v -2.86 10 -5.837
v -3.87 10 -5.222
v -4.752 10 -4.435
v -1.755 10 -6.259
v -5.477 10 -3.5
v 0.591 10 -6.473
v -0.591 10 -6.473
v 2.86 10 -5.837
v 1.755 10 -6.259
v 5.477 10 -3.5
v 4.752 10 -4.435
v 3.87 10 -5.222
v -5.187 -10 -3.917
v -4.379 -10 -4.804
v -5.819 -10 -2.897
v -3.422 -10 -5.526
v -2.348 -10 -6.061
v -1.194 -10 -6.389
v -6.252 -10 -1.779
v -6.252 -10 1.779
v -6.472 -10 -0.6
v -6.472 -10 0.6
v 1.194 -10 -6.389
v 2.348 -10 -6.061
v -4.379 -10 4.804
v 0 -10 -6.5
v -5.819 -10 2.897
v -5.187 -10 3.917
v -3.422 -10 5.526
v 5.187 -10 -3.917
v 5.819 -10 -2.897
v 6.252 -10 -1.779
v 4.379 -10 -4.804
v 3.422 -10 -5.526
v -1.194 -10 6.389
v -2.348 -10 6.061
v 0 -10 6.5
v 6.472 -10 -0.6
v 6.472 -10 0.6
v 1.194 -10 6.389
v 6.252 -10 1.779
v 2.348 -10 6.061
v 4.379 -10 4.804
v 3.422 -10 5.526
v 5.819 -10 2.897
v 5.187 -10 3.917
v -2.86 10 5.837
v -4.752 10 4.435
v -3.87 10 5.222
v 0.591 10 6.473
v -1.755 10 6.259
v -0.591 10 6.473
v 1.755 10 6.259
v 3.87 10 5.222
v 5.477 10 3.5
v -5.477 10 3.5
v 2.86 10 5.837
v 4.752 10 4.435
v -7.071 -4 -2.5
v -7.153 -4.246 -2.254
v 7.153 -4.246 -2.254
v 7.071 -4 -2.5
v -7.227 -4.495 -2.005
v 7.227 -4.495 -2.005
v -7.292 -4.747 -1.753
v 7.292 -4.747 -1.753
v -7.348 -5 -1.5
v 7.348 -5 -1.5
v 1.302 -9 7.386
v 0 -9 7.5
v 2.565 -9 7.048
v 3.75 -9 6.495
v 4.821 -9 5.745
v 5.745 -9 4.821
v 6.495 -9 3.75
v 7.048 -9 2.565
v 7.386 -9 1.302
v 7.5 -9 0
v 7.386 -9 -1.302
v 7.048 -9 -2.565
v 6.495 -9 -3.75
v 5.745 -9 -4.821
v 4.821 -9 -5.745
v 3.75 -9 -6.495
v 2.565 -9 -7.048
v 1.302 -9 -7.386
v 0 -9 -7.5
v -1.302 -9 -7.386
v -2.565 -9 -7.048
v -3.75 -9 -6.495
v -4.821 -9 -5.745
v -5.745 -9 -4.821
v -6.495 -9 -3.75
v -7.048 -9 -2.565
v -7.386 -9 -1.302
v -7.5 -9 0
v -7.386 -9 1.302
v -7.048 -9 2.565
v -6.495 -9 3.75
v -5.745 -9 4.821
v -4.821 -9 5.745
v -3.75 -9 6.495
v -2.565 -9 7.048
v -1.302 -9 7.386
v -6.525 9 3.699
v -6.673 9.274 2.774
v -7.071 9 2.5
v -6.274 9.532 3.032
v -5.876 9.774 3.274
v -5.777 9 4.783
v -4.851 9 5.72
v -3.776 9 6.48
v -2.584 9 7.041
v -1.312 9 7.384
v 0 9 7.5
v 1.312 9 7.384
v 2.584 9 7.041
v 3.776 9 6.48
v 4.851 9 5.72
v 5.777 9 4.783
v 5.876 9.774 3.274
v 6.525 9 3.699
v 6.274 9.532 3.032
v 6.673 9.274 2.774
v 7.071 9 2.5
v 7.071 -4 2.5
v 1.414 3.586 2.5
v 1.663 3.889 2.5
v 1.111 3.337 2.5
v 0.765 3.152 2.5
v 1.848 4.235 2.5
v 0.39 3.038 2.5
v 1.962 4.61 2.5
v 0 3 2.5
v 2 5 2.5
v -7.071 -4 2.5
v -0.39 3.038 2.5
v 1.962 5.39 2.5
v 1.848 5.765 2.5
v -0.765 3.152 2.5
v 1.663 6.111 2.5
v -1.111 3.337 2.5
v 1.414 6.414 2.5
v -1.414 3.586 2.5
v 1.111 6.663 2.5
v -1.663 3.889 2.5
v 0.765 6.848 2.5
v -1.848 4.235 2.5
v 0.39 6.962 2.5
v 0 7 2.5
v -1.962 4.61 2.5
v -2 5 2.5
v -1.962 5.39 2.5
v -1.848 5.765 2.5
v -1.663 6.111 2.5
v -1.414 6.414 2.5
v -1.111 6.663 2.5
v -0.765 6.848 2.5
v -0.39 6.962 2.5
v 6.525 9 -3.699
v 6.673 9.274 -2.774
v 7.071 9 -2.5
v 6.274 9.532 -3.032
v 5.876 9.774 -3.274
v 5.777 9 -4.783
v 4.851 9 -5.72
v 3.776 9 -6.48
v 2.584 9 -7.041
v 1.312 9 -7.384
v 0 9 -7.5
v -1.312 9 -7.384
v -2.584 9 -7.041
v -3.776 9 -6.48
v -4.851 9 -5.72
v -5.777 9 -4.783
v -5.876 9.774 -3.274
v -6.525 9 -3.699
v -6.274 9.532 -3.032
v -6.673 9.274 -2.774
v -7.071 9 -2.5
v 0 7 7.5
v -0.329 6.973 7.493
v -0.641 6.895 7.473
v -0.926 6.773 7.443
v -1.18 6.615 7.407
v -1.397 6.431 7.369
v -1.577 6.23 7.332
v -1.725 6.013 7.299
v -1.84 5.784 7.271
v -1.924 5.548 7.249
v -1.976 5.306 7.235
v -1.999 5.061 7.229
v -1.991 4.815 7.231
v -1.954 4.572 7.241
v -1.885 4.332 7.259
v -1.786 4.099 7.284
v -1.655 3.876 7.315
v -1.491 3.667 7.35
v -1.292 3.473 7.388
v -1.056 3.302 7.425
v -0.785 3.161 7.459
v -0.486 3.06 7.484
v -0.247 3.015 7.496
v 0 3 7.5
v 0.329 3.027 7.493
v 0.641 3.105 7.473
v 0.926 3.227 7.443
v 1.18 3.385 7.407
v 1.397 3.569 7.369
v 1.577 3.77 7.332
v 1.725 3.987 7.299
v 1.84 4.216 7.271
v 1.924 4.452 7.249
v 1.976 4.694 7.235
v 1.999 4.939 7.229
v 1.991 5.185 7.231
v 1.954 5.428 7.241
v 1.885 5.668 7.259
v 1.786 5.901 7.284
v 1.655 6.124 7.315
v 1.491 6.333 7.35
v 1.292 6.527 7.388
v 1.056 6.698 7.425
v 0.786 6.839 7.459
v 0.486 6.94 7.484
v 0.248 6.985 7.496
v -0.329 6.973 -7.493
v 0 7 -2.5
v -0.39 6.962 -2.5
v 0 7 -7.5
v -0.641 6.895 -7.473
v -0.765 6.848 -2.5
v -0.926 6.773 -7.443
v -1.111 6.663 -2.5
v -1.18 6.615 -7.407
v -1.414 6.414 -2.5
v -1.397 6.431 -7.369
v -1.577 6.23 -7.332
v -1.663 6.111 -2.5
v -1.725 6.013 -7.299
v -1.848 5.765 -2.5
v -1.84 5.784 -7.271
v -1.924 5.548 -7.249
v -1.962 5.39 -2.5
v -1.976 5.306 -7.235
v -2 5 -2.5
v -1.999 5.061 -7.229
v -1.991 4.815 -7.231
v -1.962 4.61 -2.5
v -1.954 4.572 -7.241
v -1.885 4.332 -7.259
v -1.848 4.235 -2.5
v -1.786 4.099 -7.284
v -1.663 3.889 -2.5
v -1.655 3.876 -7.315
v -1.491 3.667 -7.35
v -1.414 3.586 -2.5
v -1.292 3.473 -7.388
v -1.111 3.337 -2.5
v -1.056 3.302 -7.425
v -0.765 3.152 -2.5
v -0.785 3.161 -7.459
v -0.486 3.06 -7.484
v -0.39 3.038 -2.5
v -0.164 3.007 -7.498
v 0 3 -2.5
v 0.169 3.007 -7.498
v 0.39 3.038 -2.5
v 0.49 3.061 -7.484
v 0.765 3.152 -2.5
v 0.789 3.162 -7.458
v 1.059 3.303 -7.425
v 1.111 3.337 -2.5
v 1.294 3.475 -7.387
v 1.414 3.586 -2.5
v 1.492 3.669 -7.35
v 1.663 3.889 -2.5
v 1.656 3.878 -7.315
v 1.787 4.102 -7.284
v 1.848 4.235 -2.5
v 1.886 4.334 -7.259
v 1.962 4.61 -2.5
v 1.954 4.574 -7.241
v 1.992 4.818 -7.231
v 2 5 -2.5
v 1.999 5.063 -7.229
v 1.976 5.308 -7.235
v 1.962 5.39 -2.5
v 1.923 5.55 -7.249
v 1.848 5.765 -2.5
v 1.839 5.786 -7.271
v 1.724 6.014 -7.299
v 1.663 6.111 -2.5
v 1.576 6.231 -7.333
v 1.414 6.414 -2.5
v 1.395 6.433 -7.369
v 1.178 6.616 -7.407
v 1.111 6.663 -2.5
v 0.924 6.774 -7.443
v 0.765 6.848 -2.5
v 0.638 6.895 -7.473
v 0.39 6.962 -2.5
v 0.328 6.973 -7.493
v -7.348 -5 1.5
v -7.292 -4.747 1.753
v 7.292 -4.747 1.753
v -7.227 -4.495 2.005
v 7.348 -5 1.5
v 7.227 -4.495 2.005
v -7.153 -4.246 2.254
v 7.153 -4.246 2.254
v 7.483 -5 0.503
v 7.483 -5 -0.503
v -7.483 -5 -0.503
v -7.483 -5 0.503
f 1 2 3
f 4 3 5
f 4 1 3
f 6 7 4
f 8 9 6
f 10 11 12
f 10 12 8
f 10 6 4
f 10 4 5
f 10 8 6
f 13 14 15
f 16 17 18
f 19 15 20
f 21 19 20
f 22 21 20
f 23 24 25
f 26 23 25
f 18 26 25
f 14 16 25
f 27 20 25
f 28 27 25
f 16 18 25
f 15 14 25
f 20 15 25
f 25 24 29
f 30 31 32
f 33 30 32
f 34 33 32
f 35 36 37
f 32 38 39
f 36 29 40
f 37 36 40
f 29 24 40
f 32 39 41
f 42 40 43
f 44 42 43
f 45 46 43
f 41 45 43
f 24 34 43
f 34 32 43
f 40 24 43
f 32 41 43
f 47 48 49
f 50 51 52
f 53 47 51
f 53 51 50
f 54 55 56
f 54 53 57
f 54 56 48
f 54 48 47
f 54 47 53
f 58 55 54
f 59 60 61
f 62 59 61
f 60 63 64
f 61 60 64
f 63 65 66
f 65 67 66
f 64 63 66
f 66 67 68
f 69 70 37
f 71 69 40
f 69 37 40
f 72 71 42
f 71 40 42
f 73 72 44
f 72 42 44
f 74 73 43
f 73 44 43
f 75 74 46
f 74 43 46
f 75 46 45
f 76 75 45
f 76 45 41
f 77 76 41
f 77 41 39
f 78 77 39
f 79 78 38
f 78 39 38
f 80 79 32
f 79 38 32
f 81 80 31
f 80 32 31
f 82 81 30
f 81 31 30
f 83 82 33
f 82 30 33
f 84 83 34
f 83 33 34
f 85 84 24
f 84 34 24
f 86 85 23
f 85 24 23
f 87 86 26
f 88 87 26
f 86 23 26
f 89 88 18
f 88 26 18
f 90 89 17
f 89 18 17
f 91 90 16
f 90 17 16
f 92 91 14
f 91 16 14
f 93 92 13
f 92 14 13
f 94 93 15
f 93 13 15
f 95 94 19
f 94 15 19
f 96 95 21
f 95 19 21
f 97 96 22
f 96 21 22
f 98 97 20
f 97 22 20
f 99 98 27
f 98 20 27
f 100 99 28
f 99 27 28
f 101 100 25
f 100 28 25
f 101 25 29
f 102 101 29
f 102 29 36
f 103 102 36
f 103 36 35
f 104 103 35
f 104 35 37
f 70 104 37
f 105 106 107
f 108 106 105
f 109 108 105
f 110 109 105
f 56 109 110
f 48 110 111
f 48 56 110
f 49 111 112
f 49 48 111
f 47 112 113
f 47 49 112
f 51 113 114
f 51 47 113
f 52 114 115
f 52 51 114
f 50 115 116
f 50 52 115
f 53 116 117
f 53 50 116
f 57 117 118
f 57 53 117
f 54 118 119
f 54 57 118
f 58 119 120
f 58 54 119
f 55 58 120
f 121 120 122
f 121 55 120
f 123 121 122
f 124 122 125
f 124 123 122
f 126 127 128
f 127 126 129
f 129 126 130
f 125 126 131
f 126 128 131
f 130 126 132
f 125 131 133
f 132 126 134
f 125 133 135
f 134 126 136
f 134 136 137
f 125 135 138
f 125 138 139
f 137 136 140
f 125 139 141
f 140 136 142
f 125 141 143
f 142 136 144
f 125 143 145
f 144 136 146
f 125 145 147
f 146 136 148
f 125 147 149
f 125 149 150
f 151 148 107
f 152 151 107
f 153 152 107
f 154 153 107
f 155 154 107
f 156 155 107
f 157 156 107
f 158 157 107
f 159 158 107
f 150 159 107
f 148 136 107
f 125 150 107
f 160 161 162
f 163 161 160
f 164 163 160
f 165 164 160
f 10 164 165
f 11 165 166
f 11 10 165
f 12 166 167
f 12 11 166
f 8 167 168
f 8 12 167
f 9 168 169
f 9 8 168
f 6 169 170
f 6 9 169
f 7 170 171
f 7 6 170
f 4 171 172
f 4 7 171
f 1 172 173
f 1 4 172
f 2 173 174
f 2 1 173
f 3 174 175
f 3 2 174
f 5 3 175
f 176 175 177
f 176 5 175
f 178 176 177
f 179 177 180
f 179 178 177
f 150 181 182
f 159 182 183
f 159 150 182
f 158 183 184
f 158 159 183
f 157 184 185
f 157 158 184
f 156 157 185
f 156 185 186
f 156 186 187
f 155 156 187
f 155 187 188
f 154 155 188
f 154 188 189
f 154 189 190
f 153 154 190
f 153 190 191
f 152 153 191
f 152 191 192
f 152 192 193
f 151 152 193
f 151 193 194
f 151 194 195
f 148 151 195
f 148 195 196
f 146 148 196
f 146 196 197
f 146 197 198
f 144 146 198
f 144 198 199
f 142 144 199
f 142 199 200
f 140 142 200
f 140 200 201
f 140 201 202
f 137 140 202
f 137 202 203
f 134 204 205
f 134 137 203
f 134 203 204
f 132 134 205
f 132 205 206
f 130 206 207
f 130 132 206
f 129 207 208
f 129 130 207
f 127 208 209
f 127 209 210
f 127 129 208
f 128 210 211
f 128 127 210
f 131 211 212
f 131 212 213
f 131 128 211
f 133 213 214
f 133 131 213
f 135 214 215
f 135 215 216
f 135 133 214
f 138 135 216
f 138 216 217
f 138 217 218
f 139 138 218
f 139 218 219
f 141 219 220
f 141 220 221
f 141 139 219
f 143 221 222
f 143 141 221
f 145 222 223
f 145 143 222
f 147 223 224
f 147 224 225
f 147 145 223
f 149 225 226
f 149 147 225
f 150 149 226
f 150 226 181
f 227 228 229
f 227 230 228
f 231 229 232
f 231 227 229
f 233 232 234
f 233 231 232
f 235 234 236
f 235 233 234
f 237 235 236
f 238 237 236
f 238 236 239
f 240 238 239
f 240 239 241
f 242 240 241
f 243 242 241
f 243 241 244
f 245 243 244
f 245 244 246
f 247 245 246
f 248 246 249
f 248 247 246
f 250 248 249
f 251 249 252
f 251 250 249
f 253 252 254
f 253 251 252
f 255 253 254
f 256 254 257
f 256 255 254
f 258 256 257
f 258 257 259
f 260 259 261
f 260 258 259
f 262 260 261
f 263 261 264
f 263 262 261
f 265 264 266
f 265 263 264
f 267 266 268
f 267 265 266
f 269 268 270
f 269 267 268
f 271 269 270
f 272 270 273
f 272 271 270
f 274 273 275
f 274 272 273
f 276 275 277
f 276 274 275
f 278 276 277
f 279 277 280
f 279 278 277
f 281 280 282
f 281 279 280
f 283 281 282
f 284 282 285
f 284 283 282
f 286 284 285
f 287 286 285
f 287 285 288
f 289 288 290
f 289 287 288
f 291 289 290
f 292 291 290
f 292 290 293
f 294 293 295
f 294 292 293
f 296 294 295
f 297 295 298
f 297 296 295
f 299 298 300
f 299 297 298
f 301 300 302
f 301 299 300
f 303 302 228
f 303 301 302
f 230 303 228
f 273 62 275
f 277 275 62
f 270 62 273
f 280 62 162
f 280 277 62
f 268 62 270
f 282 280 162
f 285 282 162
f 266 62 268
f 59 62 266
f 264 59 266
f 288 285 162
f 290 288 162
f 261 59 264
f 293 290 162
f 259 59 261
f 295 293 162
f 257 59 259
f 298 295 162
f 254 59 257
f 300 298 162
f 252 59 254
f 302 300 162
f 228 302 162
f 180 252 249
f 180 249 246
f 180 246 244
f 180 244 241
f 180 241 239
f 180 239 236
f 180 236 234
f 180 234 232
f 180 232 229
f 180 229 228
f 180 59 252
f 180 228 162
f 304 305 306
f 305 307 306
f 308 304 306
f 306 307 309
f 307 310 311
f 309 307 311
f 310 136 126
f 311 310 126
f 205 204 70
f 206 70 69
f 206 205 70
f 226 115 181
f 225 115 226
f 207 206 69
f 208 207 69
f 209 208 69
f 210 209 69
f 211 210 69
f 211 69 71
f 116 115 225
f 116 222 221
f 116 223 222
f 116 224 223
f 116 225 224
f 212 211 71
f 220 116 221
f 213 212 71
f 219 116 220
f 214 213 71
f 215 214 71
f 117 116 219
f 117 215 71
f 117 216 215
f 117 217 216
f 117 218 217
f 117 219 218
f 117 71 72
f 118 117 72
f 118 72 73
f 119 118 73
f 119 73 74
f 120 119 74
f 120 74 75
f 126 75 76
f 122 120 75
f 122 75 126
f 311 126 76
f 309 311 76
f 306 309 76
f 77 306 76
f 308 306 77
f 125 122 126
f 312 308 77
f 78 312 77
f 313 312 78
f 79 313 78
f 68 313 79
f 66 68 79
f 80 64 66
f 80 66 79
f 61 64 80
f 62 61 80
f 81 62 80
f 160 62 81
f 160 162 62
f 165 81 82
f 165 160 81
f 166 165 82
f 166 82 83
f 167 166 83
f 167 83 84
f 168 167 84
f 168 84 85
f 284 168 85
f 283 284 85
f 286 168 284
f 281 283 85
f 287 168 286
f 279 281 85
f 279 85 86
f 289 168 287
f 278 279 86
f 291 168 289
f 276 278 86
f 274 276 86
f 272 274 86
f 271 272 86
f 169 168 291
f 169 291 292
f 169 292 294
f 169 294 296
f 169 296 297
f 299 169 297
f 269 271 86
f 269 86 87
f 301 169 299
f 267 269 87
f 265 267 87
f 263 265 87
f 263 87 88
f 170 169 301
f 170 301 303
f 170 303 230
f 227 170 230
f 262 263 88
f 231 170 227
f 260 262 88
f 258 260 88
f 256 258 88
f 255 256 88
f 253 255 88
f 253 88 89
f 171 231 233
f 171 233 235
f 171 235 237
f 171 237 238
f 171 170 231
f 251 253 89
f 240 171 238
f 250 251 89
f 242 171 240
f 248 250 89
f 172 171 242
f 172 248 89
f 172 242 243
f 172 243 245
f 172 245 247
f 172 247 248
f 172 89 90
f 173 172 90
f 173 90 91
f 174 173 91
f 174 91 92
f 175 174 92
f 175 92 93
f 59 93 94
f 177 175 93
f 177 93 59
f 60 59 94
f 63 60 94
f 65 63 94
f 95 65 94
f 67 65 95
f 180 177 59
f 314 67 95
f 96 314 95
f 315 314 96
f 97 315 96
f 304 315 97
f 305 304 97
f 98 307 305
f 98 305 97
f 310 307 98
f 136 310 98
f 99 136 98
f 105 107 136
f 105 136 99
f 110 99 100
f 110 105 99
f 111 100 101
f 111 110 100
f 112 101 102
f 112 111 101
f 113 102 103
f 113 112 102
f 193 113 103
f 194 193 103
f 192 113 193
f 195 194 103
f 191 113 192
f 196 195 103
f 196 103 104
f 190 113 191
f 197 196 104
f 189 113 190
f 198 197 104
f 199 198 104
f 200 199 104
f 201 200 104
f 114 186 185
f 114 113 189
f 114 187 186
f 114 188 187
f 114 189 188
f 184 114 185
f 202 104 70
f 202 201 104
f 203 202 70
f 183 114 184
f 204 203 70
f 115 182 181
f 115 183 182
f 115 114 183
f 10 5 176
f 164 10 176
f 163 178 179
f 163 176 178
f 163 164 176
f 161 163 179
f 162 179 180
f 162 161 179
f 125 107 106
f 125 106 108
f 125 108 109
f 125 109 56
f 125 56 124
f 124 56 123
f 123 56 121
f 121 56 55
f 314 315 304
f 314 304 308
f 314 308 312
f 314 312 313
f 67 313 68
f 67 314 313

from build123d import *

# Parameters (mm, degrees)
ESBO_O1_R                  = 7.5
RESSALTO_EXTRUS_O1_DEPTH   = 10
CORTE_EXTRUS_O1_DEPTH      = 15.577379737
CORTE_EXTRUS_O1_DEPTH_BACK = 15.577379737
ESBO_O2_W                  = 5
ESBO_O2_H                  = 15
CORTE_EXTRUS_O2_DEPTH      = 15.577379737
CORTE_EXTRUS_O2_DEPTH_BACK = 15.577379737
ESBO_O3_R                  = 2
CHANFRO1_SIZE              = 1
CHANFRO2_SIZE              = 1
CHANFRO3_SIZE              = 1


with BuildPart() as part:
    # Esboço1 → Ressalto-extrusão1 (new, symmetric)
    with BuildSketch(Plane(origin=(0, 0, 0), x_dir=(1, 0, 0), z_dir=(0, 1, 0))):
        with Locations(Location((0, 0, 0), (0, 0, 270))):
            Circle(ESBO_O1_R)
    extrude(amount=RESSALTO_EXTRUS_O1_DEPTH, both=True)

    # Esboço2 → Corte-extrusão1 (cut, two sides: drawn at the far end of the back side and taken through both)
    with BuildSketch(Plane(origin=(0, 0, 0), x_dir=(0, 0, -1), z_dir=(1, 0, 0)).offset(-CORTE_EXTRUS_O1_DEPTH_BACK)):
        with Locations((0, 2.5)):
            Rectangle(ESBO_O2_W, ESBO_O2_H)
    extrude(amount=CORTE_EXTRUS_O1_DEPTH + CORTE_EXTRUS_O1_DEPTH_BACK, mode=Mode.SUBTRACT)

    # Esboço3 → Corte-extrusão2 (cut, two sides: drawn at the far end of the back side and taken through both)
    with BuildSketch(Plane.XY.offset(-CORTE_EXTRUS_O2_DEPTH_BACK)):
        with Locations(Location((0, 5, 0), (0, 0, 90))):
            Circle(ESBO_O3_R)
    extrude(amount=CORTE_EXTRUS_O2_DEPTH + CORTE_EXTRUS_O2_DEPTH_BACK, mode=Mode.SUBTRACT)

    # Chanfro1
    chanfro1_edges = [part.edges().sort_by_distance(p)[0] for p in [
        (0, -10, -7.5),
    ]]
    chamfer(chanfro1_edges, length=CHANFRO1_SIZE)

    # Chanfro2
    chanfro2_edges = [part.edges().sort_by_distance(p)[0] for p in [
        (0, 10, -7.5),
        (-4.330127019, 10, 6.123724357),
        (0, 10, -2.5),
        (0, 10, 2.5),
    ]]
    chamfer(chanfro2_edges, length=CHANFRO2_SIZE)

    # Chanfro3
    chanfro3_edges = [part.edges().sort_by_distance(p)[0] for p in [
        (0, -5, -2.5),
        (0, -5, 2.5),
    ]]
    chamfer(chanfro3_edges, length=CHANFRO3_SIZE)


solid = part.part
